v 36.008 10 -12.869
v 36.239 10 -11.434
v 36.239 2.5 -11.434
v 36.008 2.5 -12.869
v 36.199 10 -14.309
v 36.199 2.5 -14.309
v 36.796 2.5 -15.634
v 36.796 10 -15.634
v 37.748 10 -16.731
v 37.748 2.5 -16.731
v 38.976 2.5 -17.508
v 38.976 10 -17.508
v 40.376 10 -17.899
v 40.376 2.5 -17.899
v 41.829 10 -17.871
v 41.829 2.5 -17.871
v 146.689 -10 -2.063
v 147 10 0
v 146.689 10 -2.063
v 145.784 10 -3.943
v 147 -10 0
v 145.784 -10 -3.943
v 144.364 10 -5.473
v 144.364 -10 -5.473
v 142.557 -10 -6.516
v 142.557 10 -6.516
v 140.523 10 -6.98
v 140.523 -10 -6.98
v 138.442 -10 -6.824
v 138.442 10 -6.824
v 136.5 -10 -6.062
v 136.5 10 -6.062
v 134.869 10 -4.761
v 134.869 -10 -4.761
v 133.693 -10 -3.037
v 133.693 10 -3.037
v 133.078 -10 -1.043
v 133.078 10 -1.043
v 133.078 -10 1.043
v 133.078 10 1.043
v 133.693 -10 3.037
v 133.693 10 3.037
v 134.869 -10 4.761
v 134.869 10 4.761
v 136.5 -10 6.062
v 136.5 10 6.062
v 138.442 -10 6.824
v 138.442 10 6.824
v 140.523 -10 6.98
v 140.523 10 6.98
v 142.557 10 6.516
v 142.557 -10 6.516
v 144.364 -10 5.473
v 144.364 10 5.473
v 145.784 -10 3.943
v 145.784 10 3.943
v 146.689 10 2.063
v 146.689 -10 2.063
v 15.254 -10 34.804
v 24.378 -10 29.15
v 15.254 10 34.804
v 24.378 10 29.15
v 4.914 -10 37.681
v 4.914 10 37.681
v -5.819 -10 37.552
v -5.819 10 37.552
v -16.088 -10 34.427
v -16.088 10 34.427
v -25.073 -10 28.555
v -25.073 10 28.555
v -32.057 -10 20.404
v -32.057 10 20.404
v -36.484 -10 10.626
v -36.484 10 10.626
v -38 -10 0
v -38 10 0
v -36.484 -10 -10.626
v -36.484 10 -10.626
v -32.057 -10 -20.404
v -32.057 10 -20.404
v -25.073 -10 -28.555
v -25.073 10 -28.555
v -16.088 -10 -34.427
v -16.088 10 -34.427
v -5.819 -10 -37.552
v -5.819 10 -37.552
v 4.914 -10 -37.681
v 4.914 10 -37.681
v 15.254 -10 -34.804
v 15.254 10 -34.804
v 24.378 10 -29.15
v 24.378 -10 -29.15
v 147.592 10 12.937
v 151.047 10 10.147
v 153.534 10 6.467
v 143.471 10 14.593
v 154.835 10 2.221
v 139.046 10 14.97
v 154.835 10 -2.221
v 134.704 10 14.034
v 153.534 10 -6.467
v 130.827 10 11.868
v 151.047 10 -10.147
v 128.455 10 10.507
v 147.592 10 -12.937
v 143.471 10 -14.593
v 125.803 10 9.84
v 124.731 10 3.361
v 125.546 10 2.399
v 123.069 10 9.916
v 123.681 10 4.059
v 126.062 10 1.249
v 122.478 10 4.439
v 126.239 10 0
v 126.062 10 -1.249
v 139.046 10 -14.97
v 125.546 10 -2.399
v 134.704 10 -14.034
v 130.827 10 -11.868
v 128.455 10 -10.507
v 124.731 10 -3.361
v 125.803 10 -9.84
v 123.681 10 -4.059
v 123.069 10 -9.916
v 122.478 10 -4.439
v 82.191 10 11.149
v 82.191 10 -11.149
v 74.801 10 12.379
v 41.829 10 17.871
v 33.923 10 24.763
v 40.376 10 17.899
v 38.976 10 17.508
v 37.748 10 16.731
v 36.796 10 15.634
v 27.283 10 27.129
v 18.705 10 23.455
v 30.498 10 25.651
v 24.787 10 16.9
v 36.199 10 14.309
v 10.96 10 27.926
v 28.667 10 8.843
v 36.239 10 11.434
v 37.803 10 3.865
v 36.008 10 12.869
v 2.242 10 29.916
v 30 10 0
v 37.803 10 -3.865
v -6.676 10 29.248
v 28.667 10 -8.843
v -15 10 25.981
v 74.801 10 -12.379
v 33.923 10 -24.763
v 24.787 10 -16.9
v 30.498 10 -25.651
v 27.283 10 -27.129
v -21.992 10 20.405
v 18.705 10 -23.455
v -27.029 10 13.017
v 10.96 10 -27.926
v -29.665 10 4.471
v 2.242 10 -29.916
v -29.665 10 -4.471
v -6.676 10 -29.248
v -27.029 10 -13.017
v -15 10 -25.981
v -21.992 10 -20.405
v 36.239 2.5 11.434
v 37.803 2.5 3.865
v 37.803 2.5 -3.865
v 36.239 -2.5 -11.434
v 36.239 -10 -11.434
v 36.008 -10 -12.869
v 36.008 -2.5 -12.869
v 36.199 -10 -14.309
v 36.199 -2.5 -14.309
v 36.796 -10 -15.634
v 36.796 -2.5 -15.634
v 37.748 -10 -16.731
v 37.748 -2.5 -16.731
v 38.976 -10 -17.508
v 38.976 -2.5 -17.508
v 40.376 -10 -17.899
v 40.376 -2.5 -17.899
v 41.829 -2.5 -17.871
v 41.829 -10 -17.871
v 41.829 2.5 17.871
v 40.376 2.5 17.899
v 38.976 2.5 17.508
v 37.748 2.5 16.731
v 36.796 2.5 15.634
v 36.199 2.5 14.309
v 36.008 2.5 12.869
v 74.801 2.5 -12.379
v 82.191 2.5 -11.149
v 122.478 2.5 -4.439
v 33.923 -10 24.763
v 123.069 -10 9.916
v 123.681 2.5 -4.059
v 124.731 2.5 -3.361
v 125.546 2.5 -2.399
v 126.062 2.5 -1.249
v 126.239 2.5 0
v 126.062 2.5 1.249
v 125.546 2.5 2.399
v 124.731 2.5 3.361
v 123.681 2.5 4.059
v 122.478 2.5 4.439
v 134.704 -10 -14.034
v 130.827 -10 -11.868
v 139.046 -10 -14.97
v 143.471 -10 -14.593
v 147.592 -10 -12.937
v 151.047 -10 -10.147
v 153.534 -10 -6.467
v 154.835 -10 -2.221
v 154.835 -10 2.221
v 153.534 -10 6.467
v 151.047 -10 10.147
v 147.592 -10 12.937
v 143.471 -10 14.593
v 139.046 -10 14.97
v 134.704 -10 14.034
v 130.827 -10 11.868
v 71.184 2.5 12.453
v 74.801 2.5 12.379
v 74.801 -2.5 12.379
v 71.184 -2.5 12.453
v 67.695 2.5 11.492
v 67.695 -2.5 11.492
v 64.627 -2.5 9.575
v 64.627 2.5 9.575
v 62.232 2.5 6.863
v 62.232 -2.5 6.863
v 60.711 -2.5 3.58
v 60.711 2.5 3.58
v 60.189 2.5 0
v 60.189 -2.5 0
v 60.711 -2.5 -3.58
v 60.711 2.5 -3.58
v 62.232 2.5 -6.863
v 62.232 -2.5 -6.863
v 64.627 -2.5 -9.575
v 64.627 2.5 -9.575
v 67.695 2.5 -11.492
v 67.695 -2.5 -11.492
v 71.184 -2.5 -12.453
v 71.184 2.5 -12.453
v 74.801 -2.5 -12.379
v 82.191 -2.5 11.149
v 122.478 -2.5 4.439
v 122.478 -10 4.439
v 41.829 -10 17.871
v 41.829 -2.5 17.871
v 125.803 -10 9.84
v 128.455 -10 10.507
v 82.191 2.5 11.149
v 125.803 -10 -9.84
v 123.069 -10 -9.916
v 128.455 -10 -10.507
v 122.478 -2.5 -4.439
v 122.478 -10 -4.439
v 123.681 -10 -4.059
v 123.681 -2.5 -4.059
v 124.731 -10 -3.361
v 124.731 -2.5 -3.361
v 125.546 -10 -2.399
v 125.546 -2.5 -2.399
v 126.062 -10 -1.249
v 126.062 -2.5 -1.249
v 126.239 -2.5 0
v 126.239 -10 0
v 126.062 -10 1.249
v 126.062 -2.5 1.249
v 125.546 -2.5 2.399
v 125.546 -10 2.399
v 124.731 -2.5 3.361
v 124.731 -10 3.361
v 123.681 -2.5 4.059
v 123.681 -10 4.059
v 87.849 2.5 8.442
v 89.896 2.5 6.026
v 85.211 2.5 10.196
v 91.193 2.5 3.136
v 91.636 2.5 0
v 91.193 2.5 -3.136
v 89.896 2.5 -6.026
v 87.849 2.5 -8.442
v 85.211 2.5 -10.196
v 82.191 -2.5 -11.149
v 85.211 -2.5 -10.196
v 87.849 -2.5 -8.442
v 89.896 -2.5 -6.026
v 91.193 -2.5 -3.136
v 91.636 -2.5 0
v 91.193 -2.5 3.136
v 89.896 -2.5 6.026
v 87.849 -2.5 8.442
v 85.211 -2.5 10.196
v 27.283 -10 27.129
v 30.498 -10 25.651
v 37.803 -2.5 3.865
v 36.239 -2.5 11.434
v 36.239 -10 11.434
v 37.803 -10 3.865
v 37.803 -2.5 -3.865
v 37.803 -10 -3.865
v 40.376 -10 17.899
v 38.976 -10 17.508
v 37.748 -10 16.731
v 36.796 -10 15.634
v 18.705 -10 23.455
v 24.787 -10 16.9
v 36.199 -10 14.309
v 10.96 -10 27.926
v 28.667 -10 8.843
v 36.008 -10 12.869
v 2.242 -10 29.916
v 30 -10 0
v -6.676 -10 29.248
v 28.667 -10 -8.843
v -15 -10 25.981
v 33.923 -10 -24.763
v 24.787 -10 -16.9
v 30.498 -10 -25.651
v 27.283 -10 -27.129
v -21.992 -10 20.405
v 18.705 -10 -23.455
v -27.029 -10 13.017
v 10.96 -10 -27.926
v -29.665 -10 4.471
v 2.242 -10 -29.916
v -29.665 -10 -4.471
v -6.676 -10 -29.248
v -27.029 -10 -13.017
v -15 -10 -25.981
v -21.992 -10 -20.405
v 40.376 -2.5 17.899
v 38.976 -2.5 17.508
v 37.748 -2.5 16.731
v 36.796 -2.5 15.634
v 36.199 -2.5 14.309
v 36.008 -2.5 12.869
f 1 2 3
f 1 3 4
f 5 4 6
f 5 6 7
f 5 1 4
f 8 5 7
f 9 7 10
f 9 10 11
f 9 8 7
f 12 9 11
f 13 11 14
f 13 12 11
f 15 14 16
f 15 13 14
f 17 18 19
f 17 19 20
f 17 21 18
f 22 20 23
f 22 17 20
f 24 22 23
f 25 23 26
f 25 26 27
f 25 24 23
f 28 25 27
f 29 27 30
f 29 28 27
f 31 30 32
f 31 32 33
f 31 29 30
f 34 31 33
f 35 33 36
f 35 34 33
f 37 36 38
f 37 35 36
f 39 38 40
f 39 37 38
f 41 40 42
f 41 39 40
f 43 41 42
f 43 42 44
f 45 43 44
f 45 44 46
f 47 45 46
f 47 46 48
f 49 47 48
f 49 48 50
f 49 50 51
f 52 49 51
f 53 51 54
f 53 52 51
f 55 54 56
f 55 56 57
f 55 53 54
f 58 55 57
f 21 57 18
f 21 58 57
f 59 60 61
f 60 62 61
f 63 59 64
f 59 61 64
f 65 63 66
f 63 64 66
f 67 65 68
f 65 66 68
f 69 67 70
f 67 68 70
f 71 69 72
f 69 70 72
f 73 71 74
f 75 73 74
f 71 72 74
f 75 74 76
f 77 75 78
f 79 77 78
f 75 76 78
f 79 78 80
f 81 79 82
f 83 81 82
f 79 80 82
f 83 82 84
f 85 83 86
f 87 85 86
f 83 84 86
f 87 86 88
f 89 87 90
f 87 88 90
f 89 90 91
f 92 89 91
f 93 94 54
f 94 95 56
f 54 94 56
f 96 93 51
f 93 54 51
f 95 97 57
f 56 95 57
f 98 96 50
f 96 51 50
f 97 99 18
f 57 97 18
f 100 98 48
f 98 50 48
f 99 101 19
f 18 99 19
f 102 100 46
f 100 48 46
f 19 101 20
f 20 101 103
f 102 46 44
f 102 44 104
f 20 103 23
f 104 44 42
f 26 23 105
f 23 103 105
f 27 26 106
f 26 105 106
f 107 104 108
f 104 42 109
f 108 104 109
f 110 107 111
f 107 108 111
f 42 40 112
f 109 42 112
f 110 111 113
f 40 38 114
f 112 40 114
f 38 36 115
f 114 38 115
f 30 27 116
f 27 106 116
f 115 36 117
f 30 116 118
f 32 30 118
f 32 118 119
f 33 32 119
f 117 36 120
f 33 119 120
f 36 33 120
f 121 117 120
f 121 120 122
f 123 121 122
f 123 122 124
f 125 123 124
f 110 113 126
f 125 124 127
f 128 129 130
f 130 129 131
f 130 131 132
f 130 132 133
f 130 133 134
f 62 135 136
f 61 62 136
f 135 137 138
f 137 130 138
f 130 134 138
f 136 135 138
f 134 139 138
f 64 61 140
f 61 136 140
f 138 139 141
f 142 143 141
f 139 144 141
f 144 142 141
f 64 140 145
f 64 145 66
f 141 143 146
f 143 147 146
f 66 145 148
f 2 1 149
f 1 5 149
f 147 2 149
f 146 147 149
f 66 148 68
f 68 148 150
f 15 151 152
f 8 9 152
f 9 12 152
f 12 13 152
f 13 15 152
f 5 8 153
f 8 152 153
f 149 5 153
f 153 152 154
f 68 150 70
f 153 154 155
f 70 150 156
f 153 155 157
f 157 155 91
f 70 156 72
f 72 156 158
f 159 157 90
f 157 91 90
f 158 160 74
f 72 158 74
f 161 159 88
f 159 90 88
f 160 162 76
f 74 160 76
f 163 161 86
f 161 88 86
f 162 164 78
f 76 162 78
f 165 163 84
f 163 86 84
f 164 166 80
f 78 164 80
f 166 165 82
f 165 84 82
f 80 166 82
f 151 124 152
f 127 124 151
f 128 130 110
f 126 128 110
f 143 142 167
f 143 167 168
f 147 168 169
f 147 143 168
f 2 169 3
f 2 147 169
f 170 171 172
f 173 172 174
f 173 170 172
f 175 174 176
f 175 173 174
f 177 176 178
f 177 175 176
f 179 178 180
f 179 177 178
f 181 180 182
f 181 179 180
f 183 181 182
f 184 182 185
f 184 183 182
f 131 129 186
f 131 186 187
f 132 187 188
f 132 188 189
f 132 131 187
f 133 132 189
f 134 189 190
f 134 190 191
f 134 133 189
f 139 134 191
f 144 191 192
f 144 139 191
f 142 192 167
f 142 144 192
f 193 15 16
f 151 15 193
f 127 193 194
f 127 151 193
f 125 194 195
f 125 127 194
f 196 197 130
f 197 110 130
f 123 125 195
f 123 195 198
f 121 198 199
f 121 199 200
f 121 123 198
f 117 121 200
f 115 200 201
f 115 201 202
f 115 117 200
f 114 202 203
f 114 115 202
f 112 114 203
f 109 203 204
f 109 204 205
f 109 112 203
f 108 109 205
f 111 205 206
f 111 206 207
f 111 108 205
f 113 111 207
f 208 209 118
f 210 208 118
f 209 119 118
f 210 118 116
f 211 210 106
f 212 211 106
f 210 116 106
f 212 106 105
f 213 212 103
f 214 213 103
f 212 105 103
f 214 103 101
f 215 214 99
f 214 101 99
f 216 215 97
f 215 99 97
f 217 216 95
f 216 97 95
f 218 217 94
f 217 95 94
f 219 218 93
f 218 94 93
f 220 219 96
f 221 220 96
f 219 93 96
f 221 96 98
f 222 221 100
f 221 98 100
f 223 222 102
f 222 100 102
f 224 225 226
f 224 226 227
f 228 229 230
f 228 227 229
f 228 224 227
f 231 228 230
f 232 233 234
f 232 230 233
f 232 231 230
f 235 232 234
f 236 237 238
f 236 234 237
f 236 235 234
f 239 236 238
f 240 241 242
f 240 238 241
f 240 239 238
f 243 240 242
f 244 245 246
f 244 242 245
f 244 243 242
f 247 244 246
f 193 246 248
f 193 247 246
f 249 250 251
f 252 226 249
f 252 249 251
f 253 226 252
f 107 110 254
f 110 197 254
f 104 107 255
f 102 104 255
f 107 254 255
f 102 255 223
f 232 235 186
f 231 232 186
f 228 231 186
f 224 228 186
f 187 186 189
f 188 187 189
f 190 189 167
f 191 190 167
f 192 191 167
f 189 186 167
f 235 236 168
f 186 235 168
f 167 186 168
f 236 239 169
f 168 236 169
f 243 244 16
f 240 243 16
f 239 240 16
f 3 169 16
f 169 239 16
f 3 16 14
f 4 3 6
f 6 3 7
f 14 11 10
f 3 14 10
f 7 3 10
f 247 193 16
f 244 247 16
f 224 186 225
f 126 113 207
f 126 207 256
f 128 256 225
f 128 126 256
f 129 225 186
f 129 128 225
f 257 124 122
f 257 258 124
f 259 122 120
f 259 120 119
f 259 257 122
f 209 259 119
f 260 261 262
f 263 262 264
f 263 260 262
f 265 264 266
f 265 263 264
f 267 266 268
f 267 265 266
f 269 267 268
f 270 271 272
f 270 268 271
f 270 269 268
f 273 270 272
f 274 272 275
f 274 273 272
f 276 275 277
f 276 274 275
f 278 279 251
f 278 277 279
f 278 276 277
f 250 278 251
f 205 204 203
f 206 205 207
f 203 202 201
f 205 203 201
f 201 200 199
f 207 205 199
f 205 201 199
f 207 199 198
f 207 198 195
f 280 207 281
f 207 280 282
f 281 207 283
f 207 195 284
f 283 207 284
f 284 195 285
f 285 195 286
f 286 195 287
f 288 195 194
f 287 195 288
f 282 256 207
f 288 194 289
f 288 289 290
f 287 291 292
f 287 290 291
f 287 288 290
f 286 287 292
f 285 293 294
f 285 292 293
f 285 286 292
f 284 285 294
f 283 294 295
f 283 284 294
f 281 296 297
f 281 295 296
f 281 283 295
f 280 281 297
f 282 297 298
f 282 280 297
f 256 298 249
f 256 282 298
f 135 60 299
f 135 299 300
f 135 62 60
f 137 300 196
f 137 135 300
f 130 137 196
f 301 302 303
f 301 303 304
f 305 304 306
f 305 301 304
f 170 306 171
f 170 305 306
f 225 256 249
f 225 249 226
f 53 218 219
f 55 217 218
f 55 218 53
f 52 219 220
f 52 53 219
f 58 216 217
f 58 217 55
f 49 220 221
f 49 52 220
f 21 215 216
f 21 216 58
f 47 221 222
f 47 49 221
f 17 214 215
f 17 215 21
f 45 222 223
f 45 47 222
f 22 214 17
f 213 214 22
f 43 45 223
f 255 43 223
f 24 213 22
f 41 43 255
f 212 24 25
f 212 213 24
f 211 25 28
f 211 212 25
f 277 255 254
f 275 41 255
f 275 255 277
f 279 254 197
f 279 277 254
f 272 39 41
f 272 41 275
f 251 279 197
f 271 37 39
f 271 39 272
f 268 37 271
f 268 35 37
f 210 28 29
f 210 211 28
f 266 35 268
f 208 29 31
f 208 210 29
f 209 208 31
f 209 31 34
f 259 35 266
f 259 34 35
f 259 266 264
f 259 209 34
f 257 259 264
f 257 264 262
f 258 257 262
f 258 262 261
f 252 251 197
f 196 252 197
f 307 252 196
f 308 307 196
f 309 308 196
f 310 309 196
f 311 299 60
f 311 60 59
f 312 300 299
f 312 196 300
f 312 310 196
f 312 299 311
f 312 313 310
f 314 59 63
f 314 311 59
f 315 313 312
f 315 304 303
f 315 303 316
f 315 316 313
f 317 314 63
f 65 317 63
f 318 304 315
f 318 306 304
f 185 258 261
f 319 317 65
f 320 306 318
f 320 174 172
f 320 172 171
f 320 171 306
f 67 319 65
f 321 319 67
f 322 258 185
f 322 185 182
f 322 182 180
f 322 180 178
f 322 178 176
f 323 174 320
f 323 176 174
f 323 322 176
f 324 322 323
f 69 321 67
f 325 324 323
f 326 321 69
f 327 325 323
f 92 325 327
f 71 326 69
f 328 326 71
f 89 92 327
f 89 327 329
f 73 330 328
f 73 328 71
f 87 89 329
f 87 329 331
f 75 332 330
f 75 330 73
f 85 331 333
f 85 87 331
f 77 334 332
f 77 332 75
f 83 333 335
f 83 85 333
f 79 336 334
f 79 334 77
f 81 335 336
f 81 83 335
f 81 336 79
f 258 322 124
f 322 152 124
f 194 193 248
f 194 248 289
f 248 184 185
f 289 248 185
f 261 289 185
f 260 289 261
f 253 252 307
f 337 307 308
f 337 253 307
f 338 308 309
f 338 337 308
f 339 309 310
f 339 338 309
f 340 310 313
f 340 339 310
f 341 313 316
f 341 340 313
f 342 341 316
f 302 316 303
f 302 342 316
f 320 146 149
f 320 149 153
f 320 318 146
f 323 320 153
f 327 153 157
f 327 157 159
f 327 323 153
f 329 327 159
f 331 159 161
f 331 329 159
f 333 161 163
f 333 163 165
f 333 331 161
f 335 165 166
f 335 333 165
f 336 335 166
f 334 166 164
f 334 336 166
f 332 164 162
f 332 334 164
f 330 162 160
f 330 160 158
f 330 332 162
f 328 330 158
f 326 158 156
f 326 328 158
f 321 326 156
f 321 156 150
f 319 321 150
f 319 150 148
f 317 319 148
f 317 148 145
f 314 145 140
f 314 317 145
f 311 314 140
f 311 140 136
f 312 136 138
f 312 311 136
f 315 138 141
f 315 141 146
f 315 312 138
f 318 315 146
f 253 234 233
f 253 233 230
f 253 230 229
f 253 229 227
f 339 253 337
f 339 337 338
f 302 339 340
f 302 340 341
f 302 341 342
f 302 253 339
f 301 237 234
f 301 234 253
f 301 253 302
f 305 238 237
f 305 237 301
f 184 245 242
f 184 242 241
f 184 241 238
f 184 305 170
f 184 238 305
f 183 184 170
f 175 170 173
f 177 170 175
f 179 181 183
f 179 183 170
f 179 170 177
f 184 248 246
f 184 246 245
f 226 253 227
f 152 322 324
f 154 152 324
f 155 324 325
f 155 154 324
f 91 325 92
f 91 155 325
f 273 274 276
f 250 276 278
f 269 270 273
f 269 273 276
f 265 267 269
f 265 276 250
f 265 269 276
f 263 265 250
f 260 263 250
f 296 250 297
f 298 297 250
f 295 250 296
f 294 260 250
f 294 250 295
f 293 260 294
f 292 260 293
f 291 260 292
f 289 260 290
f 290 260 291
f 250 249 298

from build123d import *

# Parameters (mm, degrees)
SKETCH1_R           = 30
SKETCH1_R_2         = 7
BOSS_EXTRUDE1_DEPTH = 10
FILLET1_R           = 10
FILLET2_R           = 20
CUT_EXTRUDE4_DEPTH  = 21
BOSS_EXTRUDE2_DEPTH = 2.5
CUT_EXTRUDE3_DEPTH  = 21


with BuildPart() as part:
    # Sketch1 → Boss-Extrude1 (new body, symmetric)
    with BuildSketch(Plane(origin=(0, 0, 0), x_dir=(1, 0, 0), z_dir=(0, 1, 0))):
        with BuildLine():
            Line((27.935473676, 25.760615491), (128.063755469, 9.084385863))
            ThreePointArc((128.063755469, 9.084385863), (155, 0), (128.063755469, -9.084385863))
            Line((128.063755469, -9.084385863), (27.935473676, -25.760615491))
            ThreePointArc((27.935473676, -25.760615491), (-38, 0), (27.935473676, 25.760615491))
        make_face()
        Circle(SKETCH1_R, mode=Mode.SUBTRACT)
        with Locations((140, 0)):
            Circle(SKETCH1_R_2, mode=Mode.SUBTRACT)
    extrude(amount=BOSS_EXTRUDE1_DEPTH, both=True)

    # Fillet1
    fillet1_edges = [part.edges().sort_by_distance(p)[0] for p in [
        (128.063755469, 0, -9.084385863),
        (128.063755469, 0, 9.084385863),
    ]]
    fillet(fillet1_edges, radius=FILLET1_R)

    # Fillet2
    fillet2_edges = [part.edges().sort_by_distance(p)[0] for p in [
        (27.935473676, 0, -25.760615491),
        (27.935473676, 0, 25.760615491),
    ]]
    fillet(fillet2_edges, radius=FILLET2_R)

    # Sketch14 → Cut-Extrude4 (cut, through all)
    with BuildSketch(Plane(origin=(0, 10, 0), x_dir=(1, 0, 0), z_dir=(0, 1, 0))):
        with BuildLine():
            Line((41.828554558, 17.870982725), (122.478416149, 4.438857582))
            ThreePointArc((122.478416149, 4.438857582), (126.239130435, 0), (122.478416149, -4.438857582))
            Line((122.478416149, -4.438857582), (41.828554558, -17.870982725))
            ThreePointArc((41.828554558, -17.870982725), (37.231968897, -16.217361812), (36.238855523, -11.43439331))
            ThreePointArc((36.238855523, -11.43439331), (38, 0), (36.238855523, 11.43439331))
            ThreePointArc((36.238855523, 11.43439331), (37.231968897, 16.217361812), (41.828554558, 17.870982725))
        make_face()
    extrude(amount=-CUT_EXTRUDE4_DEPTH, mode=Mode.SUBTRACT)

    # Sketch11 → Boss-Extrude2 (add, symmetric)
    with BuildSketch(Plane(origin=(0, 0, 0), x_dir=(1, 0, 0), z_dir=(0, 1, 0))):
        with BuildLine():
            Line((41.828554558, 17.870982725), (122.478416149, 4.438857582))
            ThreePointArc((122.478416149, 4.438857582), (126.239130435, 0), (122.478416149, -4.438857582))
            Line((122.478416149, -4.438857582), (41.828554558, -17.870982725))
            ThreePointArc((41.828554558, -17.870982725), (37.231968897, -16.217361812), (36.238855523, -11.43439331))
            ThreePointArc((36.238855523, -11.43439331), (38, 0), (36.238855523, 11.43439331))
            ThreePointArc((36.238855523, 11.43439331), (37.231968897, 16.217361812), (41.828554558, 17.870982725))
        make_face()
    extrude(amount=BOSS_EXTRUDE2_DEPTH, both=True)

    # Sketch2 → Cut-Extrude3 (cut, through all)
    with BuildSketch(Plane(origin=(0, 10, 0), x_dir=(1, 0, 0), z_dir=(0, 1, 0))):
        with BuildLine():
            Line((74.800916149, 12.37948059), (82.190906374, 11.148687733))
            ThreePointArc((82.190906374, 11.148687733), (91.636361303, 0), (82.190906374, -11.148687733))
            Line((82.190906374, -11.148687733), (74.800916149, -12.37948059))
            ThreePointArc((74.800916149, -12.37948059), (60.189130435, 0), (74.800916149, 12.37948059))
        make_face()
    extrude(amount=-CUT_EXTRUDE3_DEPTH, mode=Mode.SUBTRACT)


solid = part.part
